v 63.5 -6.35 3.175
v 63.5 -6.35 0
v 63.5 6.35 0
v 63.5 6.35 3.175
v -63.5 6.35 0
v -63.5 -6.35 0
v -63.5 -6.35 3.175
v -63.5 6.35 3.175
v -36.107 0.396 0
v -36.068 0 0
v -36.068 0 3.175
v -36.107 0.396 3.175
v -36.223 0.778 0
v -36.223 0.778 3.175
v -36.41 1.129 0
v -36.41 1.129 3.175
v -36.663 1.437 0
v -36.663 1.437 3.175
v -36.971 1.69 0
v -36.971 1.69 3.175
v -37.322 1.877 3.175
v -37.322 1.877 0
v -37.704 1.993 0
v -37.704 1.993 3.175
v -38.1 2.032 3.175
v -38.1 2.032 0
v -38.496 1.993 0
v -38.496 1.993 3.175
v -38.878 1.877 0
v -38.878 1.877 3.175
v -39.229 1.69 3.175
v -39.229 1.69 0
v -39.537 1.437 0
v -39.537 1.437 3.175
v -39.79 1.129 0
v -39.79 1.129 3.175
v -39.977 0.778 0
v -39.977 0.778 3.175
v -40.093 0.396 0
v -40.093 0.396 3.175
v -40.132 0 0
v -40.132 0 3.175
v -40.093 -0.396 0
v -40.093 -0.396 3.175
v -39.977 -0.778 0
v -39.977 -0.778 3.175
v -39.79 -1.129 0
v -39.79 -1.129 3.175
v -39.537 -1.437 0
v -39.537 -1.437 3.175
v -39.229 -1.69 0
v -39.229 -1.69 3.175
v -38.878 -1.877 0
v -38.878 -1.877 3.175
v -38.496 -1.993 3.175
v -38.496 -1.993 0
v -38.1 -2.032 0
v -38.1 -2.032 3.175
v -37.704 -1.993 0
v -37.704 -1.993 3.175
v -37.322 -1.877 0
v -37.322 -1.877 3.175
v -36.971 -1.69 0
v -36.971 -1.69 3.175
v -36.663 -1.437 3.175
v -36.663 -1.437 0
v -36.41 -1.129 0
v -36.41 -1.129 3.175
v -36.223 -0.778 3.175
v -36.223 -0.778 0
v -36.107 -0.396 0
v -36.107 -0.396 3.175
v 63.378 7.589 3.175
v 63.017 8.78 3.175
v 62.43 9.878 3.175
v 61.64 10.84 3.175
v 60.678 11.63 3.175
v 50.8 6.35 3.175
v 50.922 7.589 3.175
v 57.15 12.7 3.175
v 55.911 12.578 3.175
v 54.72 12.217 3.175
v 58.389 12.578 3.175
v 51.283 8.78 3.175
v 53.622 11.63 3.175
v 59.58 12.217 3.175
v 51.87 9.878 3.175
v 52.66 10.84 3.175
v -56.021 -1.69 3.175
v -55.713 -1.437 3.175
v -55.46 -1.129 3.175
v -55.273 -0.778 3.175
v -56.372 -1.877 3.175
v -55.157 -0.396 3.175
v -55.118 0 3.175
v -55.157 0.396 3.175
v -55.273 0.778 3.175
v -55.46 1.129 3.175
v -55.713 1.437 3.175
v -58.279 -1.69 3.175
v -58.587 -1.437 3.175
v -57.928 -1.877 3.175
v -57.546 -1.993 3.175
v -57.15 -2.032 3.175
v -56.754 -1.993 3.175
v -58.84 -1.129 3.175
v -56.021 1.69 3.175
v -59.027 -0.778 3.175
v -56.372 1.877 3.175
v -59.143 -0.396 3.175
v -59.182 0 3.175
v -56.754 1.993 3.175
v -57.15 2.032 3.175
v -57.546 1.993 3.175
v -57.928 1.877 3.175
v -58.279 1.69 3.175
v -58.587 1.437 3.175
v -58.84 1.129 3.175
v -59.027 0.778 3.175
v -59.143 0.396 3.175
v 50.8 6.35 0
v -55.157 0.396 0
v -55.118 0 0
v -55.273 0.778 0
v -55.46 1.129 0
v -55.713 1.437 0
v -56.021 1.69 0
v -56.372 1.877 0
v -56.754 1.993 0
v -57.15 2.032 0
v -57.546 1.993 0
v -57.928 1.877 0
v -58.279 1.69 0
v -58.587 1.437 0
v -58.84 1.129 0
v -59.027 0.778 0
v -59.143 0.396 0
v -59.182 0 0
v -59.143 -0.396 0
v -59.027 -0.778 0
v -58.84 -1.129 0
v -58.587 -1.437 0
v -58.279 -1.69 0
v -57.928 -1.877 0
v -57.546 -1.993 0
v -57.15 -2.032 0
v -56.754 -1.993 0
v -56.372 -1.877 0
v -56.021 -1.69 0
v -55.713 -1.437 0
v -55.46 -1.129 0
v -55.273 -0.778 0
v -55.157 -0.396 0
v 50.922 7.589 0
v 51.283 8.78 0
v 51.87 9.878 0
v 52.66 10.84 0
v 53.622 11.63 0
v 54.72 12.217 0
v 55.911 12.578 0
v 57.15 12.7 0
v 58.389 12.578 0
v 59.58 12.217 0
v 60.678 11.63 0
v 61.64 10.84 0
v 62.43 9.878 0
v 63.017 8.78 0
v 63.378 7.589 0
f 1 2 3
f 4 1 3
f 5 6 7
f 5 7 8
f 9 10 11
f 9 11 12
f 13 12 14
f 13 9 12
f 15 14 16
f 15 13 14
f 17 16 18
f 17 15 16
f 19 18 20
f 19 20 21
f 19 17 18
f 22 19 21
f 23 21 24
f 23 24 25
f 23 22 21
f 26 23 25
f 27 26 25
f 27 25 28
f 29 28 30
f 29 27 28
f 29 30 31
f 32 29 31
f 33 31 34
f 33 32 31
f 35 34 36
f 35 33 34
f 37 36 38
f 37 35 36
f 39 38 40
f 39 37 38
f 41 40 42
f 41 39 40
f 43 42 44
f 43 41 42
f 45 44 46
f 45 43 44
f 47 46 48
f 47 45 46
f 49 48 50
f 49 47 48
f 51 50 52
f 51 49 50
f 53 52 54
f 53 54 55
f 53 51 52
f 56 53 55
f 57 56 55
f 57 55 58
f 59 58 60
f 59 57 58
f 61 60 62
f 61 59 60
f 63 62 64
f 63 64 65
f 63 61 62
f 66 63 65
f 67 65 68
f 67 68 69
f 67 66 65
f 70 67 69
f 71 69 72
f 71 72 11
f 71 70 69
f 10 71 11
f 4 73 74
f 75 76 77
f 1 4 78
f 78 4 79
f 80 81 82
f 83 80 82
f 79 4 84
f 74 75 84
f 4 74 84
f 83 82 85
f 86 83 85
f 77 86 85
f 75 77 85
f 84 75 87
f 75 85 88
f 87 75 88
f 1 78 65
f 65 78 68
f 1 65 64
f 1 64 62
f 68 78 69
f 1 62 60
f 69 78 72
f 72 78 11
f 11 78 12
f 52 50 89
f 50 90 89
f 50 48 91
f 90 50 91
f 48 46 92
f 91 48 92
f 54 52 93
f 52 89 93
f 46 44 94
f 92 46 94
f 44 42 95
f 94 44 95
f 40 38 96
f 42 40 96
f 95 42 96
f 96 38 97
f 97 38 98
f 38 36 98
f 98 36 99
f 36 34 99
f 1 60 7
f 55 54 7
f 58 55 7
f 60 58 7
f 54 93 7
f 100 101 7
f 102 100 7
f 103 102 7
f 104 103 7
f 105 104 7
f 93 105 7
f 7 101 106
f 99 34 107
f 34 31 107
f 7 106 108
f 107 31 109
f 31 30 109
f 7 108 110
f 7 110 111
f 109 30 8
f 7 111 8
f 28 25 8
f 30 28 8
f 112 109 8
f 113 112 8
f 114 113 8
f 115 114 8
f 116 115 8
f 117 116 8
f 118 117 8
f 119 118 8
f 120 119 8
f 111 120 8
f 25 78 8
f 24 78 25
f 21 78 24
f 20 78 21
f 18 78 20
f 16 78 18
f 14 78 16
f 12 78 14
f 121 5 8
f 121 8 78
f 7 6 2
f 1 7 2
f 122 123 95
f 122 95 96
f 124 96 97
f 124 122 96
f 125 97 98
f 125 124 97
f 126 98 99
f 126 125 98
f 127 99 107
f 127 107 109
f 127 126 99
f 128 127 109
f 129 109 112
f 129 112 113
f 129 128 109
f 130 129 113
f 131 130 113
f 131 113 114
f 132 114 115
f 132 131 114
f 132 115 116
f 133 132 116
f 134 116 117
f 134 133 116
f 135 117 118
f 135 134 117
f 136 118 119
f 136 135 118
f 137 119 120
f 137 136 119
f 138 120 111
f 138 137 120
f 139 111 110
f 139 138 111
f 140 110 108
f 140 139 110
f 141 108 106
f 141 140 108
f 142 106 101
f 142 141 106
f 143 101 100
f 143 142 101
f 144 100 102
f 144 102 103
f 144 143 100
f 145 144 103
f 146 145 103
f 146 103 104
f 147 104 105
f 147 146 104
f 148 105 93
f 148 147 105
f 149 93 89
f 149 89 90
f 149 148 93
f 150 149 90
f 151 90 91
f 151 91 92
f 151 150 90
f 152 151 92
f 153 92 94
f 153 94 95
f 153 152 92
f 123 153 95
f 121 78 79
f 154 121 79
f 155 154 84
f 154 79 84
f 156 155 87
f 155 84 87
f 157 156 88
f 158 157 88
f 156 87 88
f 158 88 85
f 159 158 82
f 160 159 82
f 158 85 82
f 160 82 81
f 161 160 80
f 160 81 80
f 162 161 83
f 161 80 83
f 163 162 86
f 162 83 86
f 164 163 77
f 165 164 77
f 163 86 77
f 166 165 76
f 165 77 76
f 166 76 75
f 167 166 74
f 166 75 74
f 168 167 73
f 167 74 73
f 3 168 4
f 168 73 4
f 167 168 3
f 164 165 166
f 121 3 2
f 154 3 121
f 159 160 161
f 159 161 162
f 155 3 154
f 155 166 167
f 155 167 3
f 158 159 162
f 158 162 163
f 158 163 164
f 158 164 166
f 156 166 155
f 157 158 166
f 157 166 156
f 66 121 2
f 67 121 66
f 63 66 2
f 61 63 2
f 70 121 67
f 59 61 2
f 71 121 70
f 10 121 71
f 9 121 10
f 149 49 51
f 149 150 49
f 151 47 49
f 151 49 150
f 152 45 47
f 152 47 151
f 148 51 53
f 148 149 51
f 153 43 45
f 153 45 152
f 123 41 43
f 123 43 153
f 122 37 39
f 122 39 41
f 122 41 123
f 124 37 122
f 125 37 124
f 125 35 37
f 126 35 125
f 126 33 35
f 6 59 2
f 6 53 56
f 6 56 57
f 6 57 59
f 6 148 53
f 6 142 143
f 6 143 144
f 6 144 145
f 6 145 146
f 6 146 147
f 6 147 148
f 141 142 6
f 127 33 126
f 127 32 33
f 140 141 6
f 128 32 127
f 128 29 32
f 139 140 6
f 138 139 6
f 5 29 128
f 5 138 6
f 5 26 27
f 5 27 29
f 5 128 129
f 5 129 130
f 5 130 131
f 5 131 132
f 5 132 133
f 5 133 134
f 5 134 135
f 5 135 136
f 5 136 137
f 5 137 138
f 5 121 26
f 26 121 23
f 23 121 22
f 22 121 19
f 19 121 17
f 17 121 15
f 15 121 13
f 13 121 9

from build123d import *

# Parameters (mm, degrees)
SKETCH1_W           = 127
SKETCH1_H           = 12.7
SKETCH1_R           = 2.032
BOSS_EXTRUDE1_DEPTH = 3.175
BOSS_EXTRUDE2_DEPTH = 3.175


with BuildPart() as part:
    # Sketch1 → Boss-Extrude1 (new body)
    with BuildSketch(Plane.XY):
        Rectangle(SKETCH1_W, SKETCH1_H)
        with Locations((-57.15, 0)):
            Circle(SKETCH1_R, mode=Mode.SUBTRACT)
        with Locations((-38.1, 0)):
            Circle(SKETCH1_R, mode=Mode.SUBTRACT)
    extrude(amount=BOSS_EXTRUDE1_DEPTH)

    # Sketch2 → Boss-Extrude2 (add)
    with BuildSketch(Plane.XY.offset(3.175)):
        with BuildLine():
            Line((63.5, 6.35), (50.8, 6.35))
            ThreePointArc((50.8, 6.35), (57.15, 12.7), (63.5, 6.35))
        make_face()
    extrude(amount=-BOSS_EXTRUDE2_DEPTH)


solid = part.part
